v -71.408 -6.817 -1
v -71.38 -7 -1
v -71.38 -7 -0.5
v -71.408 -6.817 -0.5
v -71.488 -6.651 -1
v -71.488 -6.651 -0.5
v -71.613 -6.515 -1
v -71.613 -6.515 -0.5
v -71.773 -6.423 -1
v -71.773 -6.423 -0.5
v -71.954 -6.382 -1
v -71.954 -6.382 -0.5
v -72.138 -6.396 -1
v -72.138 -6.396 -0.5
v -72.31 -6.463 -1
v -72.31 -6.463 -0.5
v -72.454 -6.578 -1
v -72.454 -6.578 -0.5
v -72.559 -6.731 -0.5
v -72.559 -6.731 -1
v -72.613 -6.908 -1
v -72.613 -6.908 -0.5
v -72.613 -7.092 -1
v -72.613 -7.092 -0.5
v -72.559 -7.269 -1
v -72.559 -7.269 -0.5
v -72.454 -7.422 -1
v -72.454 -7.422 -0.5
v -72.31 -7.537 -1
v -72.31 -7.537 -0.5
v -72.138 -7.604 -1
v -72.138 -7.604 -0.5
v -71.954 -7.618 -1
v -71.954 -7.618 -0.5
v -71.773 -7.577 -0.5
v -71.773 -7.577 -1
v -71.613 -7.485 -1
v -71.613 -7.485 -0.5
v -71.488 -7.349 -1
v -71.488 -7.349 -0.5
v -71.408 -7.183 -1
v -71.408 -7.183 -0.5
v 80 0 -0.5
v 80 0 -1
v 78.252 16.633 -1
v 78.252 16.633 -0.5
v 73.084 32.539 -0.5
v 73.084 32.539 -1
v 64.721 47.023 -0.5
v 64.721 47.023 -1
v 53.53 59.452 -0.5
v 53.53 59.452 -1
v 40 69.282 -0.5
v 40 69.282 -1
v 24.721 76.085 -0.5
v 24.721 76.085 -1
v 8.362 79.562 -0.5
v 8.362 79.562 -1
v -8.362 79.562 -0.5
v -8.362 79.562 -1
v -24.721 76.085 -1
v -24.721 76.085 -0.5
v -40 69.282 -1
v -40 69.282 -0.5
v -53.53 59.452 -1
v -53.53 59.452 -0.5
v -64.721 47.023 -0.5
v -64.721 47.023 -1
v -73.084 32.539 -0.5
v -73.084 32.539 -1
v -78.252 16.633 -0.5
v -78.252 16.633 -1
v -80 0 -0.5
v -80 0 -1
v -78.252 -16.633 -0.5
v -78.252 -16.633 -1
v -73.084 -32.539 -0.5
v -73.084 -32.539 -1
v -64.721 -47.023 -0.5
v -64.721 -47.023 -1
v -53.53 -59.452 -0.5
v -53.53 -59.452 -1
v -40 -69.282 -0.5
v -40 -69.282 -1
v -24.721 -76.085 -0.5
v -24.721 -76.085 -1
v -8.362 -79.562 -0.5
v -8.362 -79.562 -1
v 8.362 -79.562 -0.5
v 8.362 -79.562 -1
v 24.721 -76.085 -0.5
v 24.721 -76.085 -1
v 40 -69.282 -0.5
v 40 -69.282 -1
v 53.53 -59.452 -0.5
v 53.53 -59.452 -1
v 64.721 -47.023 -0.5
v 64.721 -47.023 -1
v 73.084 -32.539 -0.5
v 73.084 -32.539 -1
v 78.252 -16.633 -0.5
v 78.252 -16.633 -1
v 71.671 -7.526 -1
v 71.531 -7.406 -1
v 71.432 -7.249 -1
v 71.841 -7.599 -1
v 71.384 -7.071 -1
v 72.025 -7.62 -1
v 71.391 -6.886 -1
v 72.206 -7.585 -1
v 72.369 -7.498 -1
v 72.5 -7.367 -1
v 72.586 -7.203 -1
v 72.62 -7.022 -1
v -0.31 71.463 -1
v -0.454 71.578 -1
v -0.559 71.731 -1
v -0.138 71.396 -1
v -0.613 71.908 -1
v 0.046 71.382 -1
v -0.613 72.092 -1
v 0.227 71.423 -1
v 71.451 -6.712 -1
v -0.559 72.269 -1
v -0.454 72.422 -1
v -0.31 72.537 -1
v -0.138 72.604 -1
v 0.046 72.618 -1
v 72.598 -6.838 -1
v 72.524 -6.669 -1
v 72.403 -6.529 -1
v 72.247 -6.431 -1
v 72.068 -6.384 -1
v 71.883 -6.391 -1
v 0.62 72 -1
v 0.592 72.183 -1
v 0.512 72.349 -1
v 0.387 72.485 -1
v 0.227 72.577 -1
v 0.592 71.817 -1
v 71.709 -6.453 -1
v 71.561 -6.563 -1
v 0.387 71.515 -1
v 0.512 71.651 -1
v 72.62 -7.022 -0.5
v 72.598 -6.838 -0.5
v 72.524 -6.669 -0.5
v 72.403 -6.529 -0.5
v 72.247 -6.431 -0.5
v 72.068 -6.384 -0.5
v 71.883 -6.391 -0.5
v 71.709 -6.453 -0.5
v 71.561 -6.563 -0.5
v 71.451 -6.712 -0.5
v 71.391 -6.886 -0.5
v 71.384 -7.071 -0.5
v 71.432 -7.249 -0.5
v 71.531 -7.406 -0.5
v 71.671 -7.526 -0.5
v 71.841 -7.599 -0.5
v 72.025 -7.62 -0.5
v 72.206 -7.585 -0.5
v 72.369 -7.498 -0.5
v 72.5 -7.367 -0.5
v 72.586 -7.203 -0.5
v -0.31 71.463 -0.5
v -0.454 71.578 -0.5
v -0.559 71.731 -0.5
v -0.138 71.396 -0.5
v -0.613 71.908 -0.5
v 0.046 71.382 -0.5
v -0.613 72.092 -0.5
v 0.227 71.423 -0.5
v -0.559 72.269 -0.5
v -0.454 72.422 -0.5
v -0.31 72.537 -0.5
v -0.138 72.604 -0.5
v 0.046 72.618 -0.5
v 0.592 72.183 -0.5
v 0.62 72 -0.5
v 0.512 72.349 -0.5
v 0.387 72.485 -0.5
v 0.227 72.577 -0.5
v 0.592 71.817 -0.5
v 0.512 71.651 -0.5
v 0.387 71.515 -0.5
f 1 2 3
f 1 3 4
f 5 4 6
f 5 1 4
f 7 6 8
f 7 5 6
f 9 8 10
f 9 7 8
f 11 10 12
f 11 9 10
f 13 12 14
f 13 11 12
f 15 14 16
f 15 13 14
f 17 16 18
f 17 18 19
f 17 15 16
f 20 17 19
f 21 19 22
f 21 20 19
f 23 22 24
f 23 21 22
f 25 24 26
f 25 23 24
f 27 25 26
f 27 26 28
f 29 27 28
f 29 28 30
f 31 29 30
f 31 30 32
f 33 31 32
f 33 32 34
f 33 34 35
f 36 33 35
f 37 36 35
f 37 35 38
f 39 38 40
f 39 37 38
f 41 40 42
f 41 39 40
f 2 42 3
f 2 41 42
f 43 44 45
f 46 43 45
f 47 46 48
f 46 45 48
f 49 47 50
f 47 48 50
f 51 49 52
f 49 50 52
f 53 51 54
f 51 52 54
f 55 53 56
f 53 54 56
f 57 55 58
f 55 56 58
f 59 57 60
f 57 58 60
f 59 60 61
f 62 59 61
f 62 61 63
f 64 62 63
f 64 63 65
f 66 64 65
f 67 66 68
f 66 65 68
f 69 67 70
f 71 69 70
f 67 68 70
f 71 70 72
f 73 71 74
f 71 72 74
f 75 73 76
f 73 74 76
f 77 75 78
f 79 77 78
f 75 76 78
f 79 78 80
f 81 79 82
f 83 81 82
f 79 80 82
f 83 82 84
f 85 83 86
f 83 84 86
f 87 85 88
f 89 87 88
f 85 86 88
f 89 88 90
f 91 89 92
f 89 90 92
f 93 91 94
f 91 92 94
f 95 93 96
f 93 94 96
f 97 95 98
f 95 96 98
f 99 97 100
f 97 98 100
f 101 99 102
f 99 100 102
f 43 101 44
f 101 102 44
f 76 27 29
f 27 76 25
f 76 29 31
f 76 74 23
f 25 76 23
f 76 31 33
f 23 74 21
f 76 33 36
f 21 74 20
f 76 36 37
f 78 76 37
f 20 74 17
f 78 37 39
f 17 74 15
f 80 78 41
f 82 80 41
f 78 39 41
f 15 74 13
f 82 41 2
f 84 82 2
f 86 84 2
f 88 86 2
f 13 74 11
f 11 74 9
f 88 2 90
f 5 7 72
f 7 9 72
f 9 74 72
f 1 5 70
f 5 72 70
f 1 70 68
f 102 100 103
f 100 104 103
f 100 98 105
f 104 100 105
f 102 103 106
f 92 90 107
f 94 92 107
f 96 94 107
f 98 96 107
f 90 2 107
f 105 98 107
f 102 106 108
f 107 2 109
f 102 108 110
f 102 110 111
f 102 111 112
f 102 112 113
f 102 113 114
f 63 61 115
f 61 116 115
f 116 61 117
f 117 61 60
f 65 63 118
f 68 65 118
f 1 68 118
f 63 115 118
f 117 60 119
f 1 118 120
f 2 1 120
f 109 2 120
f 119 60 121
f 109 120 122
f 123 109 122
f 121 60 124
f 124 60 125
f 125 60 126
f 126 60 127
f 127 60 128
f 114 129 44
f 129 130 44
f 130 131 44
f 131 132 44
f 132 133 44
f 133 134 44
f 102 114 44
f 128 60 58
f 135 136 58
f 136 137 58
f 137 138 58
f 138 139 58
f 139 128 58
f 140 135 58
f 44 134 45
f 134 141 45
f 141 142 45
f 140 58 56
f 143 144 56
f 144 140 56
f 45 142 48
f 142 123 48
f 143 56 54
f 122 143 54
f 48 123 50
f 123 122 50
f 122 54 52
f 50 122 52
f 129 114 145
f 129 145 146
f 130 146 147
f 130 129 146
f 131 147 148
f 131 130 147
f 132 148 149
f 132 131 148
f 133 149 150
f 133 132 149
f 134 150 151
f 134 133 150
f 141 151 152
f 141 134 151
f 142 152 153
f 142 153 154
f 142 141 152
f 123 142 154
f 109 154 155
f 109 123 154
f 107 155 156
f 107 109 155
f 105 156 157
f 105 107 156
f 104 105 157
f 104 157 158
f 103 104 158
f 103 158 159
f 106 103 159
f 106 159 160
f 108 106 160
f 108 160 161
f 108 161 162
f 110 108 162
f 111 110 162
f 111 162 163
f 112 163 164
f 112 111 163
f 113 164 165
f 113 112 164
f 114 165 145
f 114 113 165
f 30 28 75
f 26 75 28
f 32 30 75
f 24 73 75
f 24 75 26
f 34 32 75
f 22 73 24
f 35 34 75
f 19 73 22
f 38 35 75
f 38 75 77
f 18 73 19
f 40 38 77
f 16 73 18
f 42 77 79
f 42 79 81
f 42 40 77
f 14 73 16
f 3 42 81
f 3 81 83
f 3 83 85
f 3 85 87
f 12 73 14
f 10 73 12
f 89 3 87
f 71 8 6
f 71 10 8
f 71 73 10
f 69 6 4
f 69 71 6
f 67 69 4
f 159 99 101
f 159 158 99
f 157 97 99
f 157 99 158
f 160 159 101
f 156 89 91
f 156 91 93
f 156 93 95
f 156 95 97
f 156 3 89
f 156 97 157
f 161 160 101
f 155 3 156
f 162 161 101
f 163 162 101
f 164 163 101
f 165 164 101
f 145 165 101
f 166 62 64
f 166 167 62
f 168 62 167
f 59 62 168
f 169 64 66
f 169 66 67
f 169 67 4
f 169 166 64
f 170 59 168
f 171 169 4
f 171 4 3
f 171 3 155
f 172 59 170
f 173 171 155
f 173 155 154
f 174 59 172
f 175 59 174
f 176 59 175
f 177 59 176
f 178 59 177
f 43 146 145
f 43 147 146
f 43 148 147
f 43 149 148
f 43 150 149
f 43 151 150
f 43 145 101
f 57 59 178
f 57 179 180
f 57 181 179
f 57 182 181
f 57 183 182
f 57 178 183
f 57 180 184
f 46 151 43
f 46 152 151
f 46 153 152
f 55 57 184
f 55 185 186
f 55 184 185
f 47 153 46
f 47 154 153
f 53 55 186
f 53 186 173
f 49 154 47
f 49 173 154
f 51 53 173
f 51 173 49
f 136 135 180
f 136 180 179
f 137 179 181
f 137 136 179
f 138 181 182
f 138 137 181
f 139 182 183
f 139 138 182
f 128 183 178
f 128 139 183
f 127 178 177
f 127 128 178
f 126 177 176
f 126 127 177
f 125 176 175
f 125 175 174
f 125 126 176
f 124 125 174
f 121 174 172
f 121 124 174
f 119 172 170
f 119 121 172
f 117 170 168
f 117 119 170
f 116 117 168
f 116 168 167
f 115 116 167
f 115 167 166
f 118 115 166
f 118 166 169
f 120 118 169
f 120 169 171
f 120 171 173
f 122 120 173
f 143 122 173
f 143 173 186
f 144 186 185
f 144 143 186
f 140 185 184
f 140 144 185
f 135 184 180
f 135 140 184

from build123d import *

# Parameters (mm, degrees)
CYLINDER003_R               = 0.62
CYLINDER003_DEPTH           = 0.5
CYLINDER002_R               = 0.62
CYLINDER002_DEPTH           = 0.5
CYLINDER001_R               = 0.62
CYLINDER001_DEPTH           = 0.5
CYLINDER001_PLACEMENT_ANGLE = -2
CYLINDER_R                  = 80
CYLINDER_DEPTH              = 0.5


with BuildPart() as cilindro003:
    # Cylinder003 → Cylinder003 (new body)
    with BuildSketch(Plane(origin=(0, 72, 0), x_dir=(1, 0, 0), z_dir=(0, 0, 1))):
        Circle(CYLINDER003_R)
    extrude(amount=CYLINDER003_DEPTH)


with BuildPart() as cilindro002:
    # Cylinder002 → Cylinder002 (new body)
    with BuildSketch(Plane(origin=(-72, -7, 0), x_dir=(1, 0, 0), z_dir=(0, 0, 1))):
        Circle(CYLINDER002_R)
    extrude(amount=CYLINDER002_DEPTH)


with BuildPart() as cilindro001:
    # Cylinder001 → Cylinder001 (new body)
    with BuildSketch(Plane.XY):
        Circle(CYLINDER001_R)
    extrude(amount=CYLINDER001_DEPTH)


with BuildPart() as cilindro001_1:
    # Cylinder001 placement: moved
    add(cilindro001.part.moved(Location((72, -7, 0))).rotate(Axis((72, -7, 0), (0, 0, 1)), CYLINDER001_PLACEMENT_ANGLE))


with BuildPart() as cut002:
    # Cylinder → Cylinder (new body)
    with BuildSketch(Plane.XY):
        Circle(CYLINDER_R)
    extrude(amount=CYLINDER_DEPTH)

    # Cut: cut Cilindro001
    add(cilindro001_1.part, mode=Mode.SUBTRACT)

    # Cut001: cut Cilindro002
    add(cilindro002.part, mode=Mode.SUBTRACT)

    # Cut002: cut Cilindro003
    add(cilindro003.part, mode=Mode.SUBTRACT)


with BuildPart() as cut002_1:
    # Cut002 placement: moved
    add(cut002.part.moved(Location((0, 0, -1))))


solid = cut002_1.part
